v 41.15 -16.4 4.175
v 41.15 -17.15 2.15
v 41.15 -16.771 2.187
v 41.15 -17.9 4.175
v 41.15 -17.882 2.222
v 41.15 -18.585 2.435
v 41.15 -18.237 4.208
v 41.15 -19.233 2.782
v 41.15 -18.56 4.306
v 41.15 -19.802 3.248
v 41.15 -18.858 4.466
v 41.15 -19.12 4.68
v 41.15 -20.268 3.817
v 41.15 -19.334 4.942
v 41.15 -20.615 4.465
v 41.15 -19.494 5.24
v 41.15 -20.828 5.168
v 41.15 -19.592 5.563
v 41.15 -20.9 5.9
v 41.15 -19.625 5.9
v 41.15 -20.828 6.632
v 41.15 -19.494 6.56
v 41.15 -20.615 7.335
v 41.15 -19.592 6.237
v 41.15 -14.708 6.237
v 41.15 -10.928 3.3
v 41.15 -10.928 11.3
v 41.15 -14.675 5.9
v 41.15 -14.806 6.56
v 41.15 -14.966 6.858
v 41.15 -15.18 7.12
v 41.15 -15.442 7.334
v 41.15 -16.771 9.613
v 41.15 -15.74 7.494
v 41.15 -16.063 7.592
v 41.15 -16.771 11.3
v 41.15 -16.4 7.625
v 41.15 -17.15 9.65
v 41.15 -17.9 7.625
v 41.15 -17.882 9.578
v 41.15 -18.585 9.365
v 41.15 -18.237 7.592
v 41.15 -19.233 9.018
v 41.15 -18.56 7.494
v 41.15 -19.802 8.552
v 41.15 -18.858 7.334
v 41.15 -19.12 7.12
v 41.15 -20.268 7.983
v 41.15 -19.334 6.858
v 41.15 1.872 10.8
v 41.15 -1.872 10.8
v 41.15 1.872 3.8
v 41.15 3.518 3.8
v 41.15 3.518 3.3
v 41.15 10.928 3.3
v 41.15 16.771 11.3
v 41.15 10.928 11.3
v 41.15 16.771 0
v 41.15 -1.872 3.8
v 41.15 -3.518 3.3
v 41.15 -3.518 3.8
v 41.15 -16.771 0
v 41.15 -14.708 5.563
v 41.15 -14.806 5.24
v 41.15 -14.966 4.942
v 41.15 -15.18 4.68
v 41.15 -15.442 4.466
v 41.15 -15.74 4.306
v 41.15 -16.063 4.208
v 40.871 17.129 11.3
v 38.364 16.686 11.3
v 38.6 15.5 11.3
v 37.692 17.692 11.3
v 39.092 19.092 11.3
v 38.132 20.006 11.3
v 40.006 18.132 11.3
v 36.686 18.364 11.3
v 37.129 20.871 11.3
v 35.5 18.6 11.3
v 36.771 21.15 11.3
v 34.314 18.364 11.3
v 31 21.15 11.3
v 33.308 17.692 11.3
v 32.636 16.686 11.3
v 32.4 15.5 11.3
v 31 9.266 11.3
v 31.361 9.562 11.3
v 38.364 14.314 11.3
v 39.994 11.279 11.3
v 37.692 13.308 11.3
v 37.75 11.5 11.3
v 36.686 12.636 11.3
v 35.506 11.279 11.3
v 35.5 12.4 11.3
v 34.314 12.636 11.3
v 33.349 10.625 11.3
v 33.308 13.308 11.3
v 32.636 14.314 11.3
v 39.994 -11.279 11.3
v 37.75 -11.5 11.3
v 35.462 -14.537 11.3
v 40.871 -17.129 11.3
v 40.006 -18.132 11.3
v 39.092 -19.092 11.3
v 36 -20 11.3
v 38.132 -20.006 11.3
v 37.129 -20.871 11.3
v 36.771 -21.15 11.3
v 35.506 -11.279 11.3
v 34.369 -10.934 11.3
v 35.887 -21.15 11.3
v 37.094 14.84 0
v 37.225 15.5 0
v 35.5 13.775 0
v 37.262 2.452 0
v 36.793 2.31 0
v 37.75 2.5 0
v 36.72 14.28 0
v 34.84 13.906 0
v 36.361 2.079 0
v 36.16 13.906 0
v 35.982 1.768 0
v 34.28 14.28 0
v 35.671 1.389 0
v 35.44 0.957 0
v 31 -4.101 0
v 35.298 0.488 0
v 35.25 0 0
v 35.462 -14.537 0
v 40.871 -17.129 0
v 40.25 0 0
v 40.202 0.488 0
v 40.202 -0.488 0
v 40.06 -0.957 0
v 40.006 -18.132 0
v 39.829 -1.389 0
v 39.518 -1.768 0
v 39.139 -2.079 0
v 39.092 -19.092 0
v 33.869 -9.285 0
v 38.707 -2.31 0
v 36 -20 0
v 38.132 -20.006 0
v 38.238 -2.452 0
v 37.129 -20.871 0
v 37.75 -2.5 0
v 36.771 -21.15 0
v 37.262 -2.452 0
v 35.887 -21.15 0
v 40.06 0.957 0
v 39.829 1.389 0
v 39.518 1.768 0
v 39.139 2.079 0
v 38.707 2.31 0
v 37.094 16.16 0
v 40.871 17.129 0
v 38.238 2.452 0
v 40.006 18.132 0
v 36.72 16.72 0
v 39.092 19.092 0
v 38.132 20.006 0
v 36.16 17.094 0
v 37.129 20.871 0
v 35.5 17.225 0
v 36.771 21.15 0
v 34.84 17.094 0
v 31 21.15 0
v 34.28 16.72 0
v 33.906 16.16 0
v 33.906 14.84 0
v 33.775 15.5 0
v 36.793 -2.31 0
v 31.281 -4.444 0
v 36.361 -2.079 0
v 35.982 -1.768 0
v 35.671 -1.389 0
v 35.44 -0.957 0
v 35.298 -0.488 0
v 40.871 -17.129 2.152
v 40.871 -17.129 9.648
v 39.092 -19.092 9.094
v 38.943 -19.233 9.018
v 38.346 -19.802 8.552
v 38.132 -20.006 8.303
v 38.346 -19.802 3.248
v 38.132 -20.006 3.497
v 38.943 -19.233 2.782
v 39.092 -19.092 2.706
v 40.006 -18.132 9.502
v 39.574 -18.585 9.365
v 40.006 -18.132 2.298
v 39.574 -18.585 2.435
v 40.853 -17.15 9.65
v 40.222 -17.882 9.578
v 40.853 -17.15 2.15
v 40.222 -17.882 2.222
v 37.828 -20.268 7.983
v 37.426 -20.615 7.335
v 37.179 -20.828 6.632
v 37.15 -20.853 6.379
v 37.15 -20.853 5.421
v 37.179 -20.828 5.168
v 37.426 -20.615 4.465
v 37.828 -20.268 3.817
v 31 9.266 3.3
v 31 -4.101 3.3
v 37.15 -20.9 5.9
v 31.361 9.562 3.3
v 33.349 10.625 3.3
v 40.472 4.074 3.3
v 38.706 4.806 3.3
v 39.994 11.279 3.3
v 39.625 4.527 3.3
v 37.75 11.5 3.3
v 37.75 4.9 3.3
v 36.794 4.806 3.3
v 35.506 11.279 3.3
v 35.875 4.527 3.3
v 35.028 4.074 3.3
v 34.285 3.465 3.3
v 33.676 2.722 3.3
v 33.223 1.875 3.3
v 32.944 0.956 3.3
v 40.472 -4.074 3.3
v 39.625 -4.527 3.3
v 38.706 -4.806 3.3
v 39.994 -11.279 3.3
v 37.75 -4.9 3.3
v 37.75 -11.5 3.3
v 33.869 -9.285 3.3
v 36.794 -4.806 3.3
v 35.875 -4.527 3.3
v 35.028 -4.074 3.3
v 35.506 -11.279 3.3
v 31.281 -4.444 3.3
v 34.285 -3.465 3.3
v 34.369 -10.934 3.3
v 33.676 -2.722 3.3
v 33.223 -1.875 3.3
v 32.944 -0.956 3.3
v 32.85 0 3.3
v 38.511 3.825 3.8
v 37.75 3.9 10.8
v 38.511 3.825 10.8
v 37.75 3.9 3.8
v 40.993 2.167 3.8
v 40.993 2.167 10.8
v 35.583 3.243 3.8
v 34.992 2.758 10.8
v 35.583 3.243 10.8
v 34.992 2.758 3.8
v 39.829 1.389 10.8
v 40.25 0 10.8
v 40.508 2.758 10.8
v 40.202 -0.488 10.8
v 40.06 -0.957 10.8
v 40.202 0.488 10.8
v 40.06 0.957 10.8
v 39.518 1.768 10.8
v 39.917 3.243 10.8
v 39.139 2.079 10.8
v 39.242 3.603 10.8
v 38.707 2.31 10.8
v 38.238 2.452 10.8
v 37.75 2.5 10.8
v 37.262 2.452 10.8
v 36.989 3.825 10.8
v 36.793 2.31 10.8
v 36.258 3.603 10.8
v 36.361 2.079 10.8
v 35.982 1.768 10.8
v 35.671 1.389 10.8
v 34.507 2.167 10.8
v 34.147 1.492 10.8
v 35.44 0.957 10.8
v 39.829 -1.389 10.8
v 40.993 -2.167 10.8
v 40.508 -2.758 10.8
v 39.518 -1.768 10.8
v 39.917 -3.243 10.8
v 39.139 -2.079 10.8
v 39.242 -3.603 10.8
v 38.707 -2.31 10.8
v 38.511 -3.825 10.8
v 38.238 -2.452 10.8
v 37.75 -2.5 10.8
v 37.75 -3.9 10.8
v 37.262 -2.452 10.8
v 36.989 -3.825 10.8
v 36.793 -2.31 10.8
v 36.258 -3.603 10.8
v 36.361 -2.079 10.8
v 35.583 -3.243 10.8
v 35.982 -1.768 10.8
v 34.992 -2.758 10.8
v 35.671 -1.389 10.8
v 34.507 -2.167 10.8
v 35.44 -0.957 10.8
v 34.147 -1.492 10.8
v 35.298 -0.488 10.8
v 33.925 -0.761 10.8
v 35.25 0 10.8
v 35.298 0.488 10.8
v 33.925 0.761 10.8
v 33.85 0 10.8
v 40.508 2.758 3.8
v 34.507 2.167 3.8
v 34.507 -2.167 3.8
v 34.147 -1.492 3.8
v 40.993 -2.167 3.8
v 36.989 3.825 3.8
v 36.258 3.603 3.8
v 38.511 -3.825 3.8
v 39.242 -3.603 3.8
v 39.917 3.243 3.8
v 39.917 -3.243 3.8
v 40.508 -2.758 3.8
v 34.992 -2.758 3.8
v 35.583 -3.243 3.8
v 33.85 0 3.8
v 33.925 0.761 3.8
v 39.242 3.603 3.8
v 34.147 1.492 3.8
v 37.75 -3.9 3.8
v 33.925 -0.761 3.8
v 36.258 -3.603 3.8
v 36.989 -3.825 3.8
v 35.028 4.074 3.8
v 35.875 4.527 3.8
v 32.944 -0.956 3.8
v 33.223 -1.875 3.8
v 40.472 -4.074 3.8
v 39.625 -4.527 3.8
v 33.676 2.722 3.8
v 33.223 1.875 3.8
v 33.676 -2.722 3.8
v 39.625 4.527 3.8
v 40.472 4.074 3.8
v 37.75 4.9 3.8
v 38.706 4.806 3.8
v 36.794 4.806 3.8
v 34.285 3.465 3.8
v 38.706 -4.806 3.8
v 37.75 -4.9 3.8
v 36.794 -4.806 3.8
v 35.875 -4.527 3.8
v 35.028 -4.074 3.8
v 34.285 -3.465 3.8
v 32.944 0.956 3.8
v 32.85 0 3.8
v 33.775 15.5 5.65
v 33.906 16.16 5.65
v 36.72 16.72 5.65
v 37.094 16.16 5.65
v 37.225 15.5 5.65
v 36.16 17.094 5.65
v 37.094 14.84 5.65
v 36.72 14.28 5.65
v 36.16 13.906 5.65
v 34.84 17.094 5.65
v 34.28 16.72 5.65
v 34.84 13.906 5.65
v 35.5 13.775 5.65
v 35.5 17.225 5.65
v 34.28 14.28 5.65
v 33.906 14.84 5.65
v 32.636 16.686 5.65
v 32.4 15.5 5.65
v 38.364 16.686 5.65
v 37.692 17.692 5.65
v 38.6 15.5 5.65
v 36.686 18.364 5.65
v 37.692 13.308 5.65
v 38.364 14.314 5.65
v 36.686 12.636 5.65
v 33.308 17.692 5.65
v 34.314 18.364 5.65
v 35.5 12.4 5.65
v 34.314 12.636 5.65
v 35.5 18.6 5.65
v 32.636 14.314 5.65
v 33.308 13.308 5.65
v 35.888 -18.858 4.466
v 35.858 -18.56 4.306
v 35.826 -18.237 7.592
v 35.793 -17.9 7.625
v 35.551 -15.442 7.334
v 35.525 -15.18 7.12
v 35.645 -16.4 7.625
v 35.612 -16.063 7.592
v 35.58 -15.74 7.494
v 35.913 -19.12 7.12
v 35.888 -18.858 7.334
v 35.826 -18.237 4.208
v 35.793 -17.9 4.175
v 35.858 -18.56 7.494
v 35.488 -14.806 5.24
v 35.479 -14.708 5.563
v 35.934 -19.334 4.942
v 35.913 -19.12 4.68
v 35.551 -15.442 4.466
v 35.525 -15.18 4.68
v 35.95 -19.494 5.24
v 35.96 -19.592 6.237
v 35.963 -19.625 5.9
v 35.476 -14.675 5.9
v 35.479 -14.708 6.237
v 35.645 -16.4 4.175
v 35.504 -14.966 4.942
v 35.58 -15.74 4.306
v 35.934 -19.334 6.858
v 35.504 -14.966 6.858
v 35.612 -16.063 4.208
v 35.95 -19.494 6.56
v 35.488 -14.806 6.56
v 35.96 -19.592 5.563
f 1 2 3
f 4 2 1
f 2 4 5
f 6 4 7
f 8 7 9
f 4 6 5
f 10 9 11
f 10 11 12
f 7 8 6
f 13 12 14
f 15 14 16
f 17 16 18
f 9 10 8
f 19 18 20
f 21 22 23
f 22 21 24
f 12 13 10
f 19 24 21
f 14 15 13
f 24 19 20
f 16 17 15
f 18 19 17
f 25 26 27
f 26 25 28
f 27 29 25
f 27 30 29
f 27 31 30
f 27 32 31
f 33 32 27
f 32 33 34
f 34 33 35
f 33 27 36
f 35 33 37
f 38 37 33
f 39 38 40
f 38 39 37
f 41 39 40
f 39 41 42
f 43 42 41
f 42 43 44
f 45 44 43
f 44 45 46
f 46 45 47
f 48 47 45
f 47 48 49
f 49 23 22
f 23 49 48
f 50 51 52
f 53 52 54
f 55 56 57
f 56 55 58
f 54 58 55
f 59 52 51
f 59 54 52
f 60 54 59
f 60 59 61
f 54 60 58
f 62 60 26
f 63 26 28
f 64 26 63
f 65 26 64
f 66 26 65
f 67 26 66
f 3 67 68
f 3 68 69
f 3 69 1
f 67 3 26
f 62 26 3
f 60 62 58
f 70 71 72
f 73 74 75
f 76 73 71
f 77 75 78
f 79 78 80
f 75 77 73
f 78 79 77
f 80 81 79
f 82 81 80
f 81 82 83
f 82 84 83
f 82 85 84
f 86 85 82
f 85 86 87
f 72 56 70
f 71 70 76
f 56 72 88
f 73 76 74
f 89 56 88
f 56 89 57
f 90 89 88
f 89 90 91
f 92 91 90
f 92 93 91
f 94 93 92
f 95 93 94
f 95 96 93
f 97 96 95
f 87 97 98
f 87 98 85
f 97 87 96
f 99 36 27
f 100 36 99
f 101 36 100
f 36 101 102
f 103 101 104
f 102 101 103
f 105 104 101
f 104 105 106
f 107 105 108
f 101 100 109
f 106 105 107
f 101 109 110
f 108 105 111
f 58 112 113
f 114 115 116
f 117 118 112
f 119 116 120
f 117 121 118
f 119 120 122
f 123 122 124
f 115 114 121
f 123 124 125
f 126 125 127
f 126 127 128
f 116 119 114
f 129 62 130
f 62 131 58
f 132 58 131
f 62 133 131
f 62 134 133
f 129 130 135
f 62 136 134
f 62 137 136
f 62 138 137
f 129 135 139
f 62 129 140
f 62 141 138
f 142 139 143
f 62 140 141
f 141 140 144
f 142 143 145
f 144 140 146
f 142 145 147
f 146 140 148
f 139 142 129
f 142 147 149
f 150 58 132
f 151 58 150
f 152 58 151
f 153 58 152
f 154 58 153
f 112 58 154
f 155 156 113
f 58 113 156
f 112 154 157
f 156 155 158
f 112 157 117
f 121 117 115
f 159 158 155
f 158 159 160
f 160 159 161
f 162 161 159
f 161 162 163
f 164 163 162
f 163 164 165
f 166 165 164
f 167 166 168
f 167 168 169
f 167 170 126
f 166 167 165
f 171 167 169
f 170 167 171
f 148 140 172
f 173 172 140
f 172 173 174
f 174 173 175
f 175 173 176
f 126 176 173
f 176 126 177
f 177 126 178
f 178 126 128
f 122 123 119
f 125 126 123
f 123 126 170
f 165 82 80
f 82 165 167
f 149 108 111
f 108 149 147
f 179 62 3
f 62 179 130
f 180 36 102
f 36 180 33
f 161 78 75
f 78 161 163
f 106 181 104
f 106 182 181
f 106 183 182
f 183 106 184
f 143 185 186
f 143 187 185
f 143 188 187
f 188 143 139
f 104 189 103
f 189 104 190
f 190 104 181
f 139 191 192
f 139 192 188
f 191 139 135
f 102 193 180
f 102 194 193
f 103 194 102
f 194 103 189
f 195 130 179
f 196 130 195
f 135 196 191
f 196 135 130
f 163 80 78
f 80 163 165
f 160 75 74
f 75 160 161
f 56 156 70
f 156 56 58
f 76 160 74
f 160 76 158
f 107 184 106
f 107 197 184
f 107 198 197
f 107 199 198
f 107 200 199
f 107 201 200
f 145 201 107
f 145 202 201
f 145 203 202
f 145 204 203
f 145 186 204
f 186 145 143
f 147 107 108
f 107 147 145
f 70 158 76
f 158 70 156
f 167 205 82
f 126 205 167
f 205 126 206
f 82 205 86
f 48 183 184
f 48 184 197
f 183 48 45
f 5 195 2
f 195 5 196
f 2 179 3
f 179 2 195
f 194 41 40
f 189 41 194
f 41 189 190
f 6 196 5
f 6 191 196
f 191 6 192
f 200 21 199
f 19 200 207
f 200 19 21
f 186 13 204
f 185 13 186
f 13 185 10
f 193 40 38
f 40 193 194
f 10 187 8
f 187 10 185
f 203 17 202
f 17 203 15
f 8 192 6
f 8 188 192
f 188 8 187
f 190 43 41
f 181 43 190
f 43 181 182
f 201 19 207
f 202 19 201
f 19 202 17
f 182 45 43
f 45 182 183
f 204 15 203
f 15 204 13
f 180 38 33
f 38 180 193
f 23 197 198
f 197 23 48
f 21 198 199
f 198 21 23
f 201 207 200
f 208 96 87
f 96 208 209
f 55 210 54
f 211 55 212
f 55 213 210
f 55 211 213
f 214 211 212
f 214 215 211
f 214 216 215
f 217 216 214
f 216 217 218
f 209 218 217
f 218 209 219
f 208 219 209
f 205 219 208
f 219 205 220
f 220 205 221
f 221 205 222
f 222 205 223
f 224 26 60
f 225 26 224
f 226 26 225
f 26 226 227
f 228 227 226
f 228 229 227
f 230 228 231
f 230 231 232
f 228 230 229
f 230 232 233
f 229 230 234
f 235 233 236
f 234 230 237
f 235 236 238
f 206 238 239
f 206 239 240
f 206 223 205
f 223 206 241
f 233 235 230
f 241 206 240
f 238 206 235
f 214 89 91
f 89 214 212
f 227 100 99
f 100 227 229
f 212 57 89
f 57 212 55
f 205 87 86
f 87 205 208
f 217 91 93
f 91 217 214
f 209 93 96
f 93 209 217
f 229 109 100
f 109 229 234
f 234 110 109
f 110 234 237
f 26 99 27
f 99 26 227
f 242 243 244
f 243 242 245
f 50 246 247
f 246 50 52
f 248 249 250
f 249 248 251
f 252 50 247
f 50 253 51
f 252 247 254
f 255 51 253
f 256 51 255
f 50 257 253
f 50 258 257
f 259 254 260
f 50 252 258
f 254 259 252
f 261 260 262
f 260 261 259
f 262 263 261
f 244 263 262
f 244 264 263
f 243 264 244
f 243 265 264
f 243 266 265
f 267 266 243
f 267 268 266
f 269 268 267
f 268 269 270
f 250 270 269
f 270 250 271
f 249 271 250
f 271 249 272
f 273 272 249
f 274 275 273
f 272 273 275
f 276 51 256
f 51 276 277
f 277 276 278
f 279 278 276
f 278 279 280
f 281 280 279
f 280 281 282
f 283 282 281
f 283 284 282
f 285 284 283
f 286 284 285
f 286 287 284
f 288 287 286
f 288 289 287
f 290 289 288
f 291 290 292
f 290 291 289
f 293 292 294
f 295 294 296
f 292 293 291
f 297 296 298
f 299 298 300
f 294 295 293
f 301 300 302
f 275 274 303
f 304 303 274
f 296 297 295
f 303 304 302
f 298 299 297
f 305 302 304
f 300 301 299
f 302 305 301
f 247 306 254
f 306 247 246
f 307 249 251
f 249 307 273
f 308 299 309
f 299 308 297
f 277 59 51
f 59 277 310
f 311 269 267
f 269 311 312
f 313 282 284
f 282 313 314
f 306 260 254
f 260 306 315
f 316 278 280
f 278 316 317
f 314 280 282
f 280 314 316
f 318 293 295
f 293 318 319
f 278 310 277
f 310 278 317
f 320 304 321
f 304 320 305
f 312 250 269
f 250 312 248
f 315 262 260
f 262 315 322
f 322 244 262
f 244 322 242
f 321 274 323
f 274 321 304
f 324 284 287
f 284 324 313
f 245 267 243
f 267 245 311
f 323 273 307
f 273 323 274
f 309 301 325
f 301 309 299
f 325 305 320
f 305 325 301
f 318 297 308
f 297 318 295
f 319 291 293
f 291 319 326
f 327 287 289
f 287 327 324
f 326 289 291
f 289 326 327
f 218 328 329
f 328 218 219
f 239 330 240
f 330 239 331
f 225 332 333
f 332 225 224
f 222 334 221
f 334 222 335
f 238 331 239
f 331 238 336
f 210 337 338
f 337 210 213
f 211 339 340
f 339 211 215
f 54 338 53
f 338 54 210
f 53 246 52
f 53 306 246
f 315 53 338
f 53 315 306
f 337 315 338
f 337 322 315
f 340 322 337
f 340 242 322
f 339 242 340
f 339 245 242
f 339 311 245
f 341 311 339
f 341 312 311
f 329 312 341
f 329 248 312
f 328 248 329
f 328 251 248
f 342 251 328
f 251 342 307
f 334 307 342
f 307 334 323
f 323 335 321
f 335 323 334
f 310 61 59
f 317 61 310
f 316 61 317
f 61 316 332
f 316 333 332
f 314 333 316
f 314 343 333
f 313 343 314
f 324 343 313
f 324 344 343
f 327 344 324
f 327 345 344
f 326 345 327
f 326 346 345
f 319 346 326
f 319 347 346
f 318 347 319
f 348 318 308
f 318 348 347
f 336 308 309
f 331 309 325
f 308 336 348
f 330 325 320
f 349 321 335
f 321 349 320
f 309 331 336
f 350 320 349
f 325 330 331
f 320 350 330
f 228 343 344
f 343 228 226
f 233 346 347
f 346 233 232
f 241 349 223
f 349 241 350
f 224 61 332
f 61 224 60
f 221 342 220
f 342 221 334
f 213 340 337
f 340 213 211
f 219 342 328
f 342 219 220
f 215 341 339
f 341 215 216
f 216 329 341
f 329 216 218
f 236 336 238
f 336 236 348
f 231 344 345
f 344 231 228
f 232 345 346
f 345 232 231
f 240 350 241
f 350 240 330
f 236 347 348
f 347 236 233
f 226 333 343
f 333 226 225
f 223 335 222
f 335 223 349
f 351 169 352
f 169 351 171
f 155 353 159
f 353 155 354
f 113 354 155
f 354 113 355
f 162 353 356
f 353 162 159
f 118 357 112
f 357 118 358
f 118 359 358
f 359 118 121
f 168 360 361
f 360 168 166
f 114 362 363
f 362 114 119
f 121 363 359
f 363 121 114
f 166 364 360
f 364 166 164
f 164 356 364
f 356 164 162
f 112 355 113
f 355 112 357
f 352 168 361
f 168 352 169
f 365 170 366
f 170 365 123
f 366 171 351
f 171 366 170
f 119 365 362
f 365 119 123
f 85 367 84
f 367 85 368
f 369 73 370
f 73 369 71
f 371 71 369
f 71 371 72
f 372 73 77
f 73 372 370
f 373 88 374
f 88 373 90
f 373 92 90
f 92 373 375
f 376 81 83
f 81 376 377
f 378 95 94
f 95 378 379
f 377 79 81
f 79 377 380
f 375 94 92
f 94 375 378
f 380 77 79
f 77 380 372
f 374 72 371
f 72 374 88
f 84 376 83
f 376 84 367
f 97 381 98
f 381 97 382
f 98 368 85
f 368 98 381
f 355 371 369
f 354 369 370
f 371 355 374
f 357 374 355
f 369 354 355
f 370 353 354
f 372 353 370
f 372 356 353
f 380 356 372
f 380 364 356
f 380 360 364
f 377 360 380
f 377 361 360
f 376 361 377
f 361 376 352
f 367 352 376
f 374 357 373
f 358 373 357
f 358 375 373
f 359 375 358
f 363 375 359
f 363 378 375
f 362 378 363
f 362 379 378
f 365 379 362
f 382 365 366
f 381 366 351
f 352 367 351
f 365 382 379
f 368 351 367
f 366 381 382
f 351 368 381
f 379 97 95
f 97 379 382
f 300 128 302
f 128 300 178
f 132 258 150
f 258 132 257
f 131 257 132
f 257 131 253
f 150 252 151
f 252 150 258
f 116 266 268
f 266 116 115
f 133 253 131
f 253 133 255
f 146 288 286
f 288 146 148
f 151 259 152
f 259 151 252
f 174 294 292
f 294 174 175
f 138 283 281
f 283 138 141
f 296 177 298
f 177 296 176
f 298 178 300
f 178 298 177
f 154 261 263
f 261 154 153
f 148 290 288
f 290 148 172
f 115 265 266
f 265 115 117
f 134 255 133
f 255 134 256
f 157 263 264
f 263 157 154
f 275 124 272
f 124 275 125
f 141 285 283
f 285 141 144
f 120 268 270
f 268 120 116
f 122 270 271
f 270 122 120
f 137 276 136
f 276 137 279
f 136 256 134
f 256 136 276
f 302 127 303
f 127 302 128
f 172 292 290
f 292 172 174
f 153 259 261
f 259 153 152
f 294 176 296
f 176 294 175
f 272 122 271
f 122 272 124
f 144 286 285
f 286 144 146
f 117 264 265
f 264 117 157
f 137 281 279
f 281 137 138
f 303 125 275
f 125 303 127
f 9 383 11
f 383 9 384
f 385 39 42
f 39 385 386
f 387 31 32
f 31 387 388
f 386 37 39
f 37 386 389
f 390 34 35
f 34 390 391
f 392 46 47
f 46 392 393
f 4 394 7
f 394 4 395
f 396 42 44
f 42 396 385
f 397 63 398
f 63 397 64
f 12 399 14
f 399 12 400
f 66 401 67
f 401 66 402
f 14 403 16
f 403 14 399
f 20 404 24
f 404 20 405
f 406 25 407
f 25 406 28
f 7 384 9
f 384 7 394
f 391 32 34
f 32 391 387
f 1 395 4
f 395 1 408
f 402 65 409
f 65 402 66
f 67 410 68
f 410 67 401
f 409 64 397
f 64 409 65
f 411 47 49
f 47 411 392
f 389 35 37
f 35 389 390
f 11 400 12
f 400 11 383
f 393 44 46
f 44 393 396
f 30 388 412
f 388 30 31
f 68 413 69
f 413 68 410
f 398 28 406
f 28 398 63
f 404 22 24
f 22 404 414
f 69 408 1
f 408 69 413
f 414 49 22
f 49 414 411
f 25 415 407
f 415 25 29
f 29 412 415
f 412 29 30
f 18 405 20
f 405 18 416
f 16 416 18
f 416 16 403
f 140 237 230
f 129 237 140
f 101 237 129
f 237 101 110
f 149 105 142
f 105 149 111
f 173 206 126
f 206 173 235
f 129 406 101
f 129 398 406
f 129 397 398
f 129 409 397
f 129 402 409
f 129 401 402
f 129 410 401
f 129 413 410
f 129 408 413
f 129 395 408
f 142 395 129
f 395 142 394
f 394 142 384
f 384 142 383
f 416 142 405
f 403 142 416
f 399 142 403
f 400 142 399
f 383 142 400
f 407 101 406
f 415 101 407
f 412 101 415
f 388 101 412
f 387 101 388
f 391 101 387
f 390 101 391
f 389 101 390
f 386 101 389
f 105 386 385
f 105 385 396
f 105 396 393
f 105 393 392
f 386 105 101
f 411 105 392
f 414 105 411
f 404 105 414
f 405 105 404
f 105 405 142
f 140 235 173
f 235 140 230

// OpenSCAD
// Compact direct drive bowden extruder for 1.75mm filament
// Licence: CC BY-SA 3.0, http://creativecommons.org/licenses/by-sa/3.0/
// Author: Dominik Scholz <schlotzz@schlotzz.com> and contributors
// Using MK8 style hobbed pulley 13x8mm from: https://www.reprapsource.com/en/show/6889
// visit: http://www.schlotzz.com
// changed: 2014-04-04, added idler slot and funnel on bowden side for easier filament insertion
// changed: 2014-04-27, placed base and idler "printer ready"
// changed: 2014-09-22, fixed non-manifold vertexes between base and filament tunnel


/*
	design goals:
	- using 13x8mm hobbed pulley
	- filament diameter parametric (1.75mm or 3mm)
	- using 608zz bearing
	- using M5 push fit connector
*/

// avoid openscad artefacts in preview
epsilon = 0.01;

// increase this if your slicer or printer make holes too tight
extra_radius = 0.1;

// major diameter of metric 3mm thread
m3_major = 2.85;
m3_radius = m3_major / 2 + extra_radius;
m3_wide_radius = m3_major / 2 + extra_radius + 0.2;

// diameter of metric 3mm hexnut screw head
m3_head_radius = 3 + extra_radius;

// drive gear
drive_gear_outer_radius = 12.00 / 2;
drive_gear_hobbed_radius = 10.5 / 2;
drive_gear_hobbed_offset = 3.2;
drive_gear_length = 13 + 0;
drive_gear_tooth_depth = .2;

// base width for frame plate
base_width = 15;
base_length = 60;
base_height = 5;

// nema 17 dimensions
nema17_width = 42.3;
nema17_hole_offsets = [
	[-15.5, -15.5, 1.5],
	[-15.5,  15.5, 1.5],
	[ 15.5, -15.5, 1.5],
	[ 15.5,  15.5, 1.5 + base_height]
];


//// filament
filament_diameter = 1.75;
//filament_diameter = 3;
filament_offset = [
	drive_gear_hobbed_radius + filament_diameter / 2 - drive_gear_tooth_depth,
	0,
	base_height + drive_gear_length - drive_gear_hobbed_offset - 2.5
];





// helper function to render a rounded slot
module rounded_slot(r = 1, h = 1, l = 0, center = false)
{
	hull()
	{
		translate([0, -l / 2, 0])
			cylinder(r = r, h = h, center = center);
		translate([0, l / 2, 0])
			cylinder(r = r, h = h, center = center);
	}
}



// mounting plate for nema 17
module nema17_mount()
{
	// settings
	width = nema17_width;
	height = base_height;
	edge_radius = 27;
	axle_radius = drive_gear_outer_radius + 1 + extra_radius;

	difference()
	{
		// base plate
		translate([0, 0, height / 2])
			intersection()
			{
				cube([width, width, height], center = true);
				cylinder(r = edge_radius, h = height + 2 * epsilon, $fn = 128, center = true);
			}
		
		// center hole
		translate([0, 0, -epsilon]	)
			cylinder(r = 11.25 + extra_radius, h = base_height + 2 * epsilon, $fn = 32);

		// axle hole
		translate([0, 0, -epsilon])
			cylinder(r = axle_radius, h = height + 2 * epsilon, $fn = 32);

		// mounting holes
		for (a = nema17_hole_offsets)
			translate(a)
			{
				cylinder(r = m3_radius, h = height * 4, center = true, $fn = 16);
				cylinder(r = m3_head_radius, h = height + epsilon, $fn = 16);
			}
	}
}


// plate for mounting extruder on frame
module frame_mount()
{
	// settings
	width = base_width;
	length = base_length;
	height = base_height;
	hole_offsets = [
		[0,  length / 2 - 6, 2.5],
		[0, -length / 2 + 6, 2.5]
	];
	corner_radius = 3;

	difference()
	{
		// base plate
		intersection()
		{
			union()
			{
				translate([0, 0, height / 2])
					cube([width, length, height], center = true);
				translate([base_width / 2 - base_height / 2 - corner_radius / 2, 0, height + corner_radius / 2])
					cube([base_height + corner_radius, nema17_width, corner_radius], center = true);
				translate([base_width / 2 - base_height / 2, 0, 6])
					cube([base_height, nema17_width, 12], center = true);
			}

			cylinder(r = base_length / 2, h = 100, $fn = 32);
		}

		// rounded corner
		translate([base_width / 2 - base_height - corner_radius, 0, height + corner_radius])
			rotate([90, 0, 0])
				cylinder(r = corner_radius, h = nema17_width + 2 * epsilon, center = true, $fn = 32);

		// mounting holes
		for (a = hole_offsets)
			translate(a)
			{
				cylinder(r = m3_wide_radius, h = height * 2 + 2 * epsilon, center = true, $fn = 16);
				cylinder(r = m3_head_radius, h = height + epsilon, $fn = 16);
			}

		// nema17 mounting holes
		translate([base_width / 2, 0, nema17_width / 2 + base_height])
			rotate([0, -90, 0])
			for (a = nema17_hole_offsets)
				translate(a)
				{
					cylinder(r = m3_radius, h = height * 4, center = true, $fn = 16);
					cylinder(r = m3_head_radius, h = height + epsilon, $fn = 16);
				}
	}
}


// inlet for filament
module filament_tunnel()
{

	width = 8;
	length = nema17_width;
	height = filament_offset[2] - base_height + 4;

	translate([0, 0, height / 2])
	{
		difference()
		{
			union()
			{
				// base
				translate([-height / 2, 0, 0])
					cube([width + height, length, height], center = true);

				// inlet strengthening
				translate([0, -length / 2, -height / 2 + filament_offset[2] - base_height])
					rotate([90, 0, 0])
						cylinder(r = 3.5, h = 1, center = true, $fn = 32);

				// push fit connector strengthening
				translate([0, length / 2, -height / 2 + filament_offset[2] - base_height])
					rotate([90, 0, 0])
						cylinder(r = 3.5, h = 1, center = true, $fn = 32);

				// idler tensioner
				intersection()
				{
					translate([5, -length / 2 + 8, 0])
						cube([width, 16, height], center = true);
					translate([-17.8, -20 ,0])
						cylinder(r = 27, h = height + 2 * epsilon, center = true, $fn = 32);
				}

			}

			// middle cutout for drive gear
			translate([-filament_offset[0], 0, 0])
				cylinder(r = 11.25 + extra_radius, h = height + 2 * epsilon, center = true, $fn = 32);

			// middle cutout for idler
			translate([11 + filament_diameter / 2, 0, 0])
				cylinder(r = 12.5, h = height + 2 * epsilon, center = true, $fn = 32);

			// idler mounting hexnut
			translate([filament_diameter + 1, -nema17_width / 2 + 4, .25])
				rotate([0, 90, 0])
					cylinder(r = m3_radius, h = 50, center = false, $fn = 32);
			translate([filament_diameter + 3, -nema17_width / 2 + 4, 5])
				cube([2.5 + 3 * extra_radius, 5.5 + 2.5 * extra_radius, 10], center = true);
			translate([filament_diameter + 3, -nema17_width / 2 + 4, 0])
				rotate([0, 90, 0])
					cylinder(r = 3.15 + 2.5 * extra_radius, h = 2.5 + 3 * extra_radius, center = true, $fn = 6);
			
			// rounded corner
			translate([-height - width / 2, 0, height / 2])
				rotate([90, 0, 0])
					cylinder(r = height, h = length + 2 * epsilon, center = true, $fn = 32);
			
			// funnnel inlet
			translate([0, -length / 2 + 1 - epsilon, -height / 2 + filament_offset[2] - base_height])
				rotate([90, 0, 0])
					cylinder(r1 = filament_diameter / 2, r2 = filament_diameter / 2 + 1 + epsilon / 1.554, h = 3 + epsilon, center = true, $fn = 16);

			// funnnel outlet
			translate([0, length / 2 - 4, -height / 2 + filament_offset[2] - base_height])
				rotate([90, 0, 0])
					cylinder(r1 = filament_diameter / 2 + 1, r2 = filament_diameter / 2, h = 2, center = true, $fn = 16);
			translate([0, 12, -height / 2 + filament_offset[2] - base_height])
				rotate([90, 0, 0])
					cylinder(r1 = filament_diameter / 2, r2 = filament_diameter / 2 + 1.25, h = 8, center = true, $fn = 16);

			// push fit connector m5 hole
			translate([0, length / 2 + 1 - 2.5 + epsilon, -height / 2 + filament_offset[2] - base_height])
				rotate([90, 0, 0])
					cylinder(r = 2.25, h = 5 + 2 * epsilon, center = true, $fn = 16);

			// filament path
			translate([0, 0, -height / 2 + filament_offset[2] - base_height])
				rotate([90, 0, 0])
					cylinder(r = filament_diameter / 2 + 2 * extra_radius, h = length + 2 * epsilon, center = true, $fn = 16);
			
		}
	}

}


// render drive gear
module drive_gear()
{
	r = drive_gear_outer_radius - drive_gear_hobbed_radius;
	rotate_extrude(convexity = 10)
	{
		difference()
		{
			square([drive_gear_outer_radius, drive_gear_length]);
			translate([drive_gear_hobbed_radius + r, drive_gear_length - drive_gear_hobbed_offset])
				circle(r = r, $fn = 16);
		}
	}
}


// render 608zz
module bearing_608zz()
{
	difference()
	{
		cylinder(r = 11, h = 7, center = true, $fn = 32);
		cylinder(r = 4, h = 7 + 2 * epsilon, center = true, $fn = 16);
	}
}


// render 624zz
module bearing_624zz()
{
	difference()
	{
		cylinder(r = 6.5, h = 5, center = true, $fn = 32);
		cylinder(r = 2, h = 5 + 2 * epsilon, center = true, $fn = 16);
	}
}


// idler with 608 bearing
module idler_608()
{
	width = nema17_width;
	height = filament_offset[2] - base_height + 4;
	edge_radius = 27;
	hole_offsets = [-width / 2 + 4, width / 2 - 4];
	bearing_bottom = filament_offset[2] / 2 - base_height / 2 - 6;

	// base plate
	translate([0, 0, height / 2])
	difference()
	{
		union()
		{
			// base
			intersection()
			{
				cube([width, width, height], center = true);
				cylinder(r = edge_radius, h = height + 2 * epsilon, $fn = 128, center = true);
				translate([17, 0, 0])
					cube([12, nema17_width + epsilon, height], center = true);
			}
			
			// spring base enforcement
			translate([17.15, -nema17_width / 2 + 4, .25])
				rotate([0, 90, 0])
					cylinder(r = 3.75, h = 4, $fn = 32);
		}

		translate([drive_gear_hobbed_radius + 11 - 0.25 + filament_diameter, 0, bearing_bottom])
		difference()
		{
			// bearing spare out
			cylinder(r = 11.5, h = 60, $fn = 32);

			// bearing mount
			cylinder(r = 4 - extra_radius, h = 7.5, $fn = 32);

			// bearing mount base
			cylinder(r = 4 - extra_radius + 1, h = 0.5, $fn = 32);
		}

		// bearing mount hole
		translate([drive_gear_hobbed_radius + 11 - 0.25 + filament_diameter, 0, 0])
			cylinder(r = 2.5, h = 50, center = true, $fn = 32);

		// tensioner bolt slot
		translate([17.15, -nema17_width / 2 + 4, .25])
			rotate([0, 90, 0])
				rounded_slot(r = m3_wide_radius, h = 50, l = 1.5, center = true, $fn = 32);

		translate([-12, -20 ,0])
			cylinder(r = 28, h = height + 2 * epsilon, center = true, $fn = 32);

		// mounting hole
		translate([15.5, 15.5, 0])
		{
			cylinder(r = m3_wide_radius, h = height * 4, center = true, $fn = 16);
			cylinder(r = m3_head_radius, h = height + epsilon, $fn = 16);
		}

	}

	translate([drive_gear_hobbed_radius + 11 - 0.25 + filament_diameter, 0, filament_offset[2] - base_height])
		%bearing_608zz();
}



module compact_extruder()
{
	// motor plate
	nema17_mount();

	// mounting plate
	translate([-nema17_width / 2 - base_height, 0, base_width / 2])
		rotate([0, 90, 0])
			frame_mount();

	// filament inlet/outlet
	translate([filament_offset[0], 0, base_height - epsilon])
		filament_tunnel();

	// drive gear
	color("grey")
		%translate([0, 0, base_height - 2.5])
			drive_gear();

	// filament
	color("red")
		%translate(filament_offset - [0, 0, epsilon])
			rotate([90, 0, 0])
				cylinder(r = filament_diameter / 2, h = 100, $fn = 16, center = true);


}

//compact_extruder();
translate([20, 0, 0])
	idler_608();
